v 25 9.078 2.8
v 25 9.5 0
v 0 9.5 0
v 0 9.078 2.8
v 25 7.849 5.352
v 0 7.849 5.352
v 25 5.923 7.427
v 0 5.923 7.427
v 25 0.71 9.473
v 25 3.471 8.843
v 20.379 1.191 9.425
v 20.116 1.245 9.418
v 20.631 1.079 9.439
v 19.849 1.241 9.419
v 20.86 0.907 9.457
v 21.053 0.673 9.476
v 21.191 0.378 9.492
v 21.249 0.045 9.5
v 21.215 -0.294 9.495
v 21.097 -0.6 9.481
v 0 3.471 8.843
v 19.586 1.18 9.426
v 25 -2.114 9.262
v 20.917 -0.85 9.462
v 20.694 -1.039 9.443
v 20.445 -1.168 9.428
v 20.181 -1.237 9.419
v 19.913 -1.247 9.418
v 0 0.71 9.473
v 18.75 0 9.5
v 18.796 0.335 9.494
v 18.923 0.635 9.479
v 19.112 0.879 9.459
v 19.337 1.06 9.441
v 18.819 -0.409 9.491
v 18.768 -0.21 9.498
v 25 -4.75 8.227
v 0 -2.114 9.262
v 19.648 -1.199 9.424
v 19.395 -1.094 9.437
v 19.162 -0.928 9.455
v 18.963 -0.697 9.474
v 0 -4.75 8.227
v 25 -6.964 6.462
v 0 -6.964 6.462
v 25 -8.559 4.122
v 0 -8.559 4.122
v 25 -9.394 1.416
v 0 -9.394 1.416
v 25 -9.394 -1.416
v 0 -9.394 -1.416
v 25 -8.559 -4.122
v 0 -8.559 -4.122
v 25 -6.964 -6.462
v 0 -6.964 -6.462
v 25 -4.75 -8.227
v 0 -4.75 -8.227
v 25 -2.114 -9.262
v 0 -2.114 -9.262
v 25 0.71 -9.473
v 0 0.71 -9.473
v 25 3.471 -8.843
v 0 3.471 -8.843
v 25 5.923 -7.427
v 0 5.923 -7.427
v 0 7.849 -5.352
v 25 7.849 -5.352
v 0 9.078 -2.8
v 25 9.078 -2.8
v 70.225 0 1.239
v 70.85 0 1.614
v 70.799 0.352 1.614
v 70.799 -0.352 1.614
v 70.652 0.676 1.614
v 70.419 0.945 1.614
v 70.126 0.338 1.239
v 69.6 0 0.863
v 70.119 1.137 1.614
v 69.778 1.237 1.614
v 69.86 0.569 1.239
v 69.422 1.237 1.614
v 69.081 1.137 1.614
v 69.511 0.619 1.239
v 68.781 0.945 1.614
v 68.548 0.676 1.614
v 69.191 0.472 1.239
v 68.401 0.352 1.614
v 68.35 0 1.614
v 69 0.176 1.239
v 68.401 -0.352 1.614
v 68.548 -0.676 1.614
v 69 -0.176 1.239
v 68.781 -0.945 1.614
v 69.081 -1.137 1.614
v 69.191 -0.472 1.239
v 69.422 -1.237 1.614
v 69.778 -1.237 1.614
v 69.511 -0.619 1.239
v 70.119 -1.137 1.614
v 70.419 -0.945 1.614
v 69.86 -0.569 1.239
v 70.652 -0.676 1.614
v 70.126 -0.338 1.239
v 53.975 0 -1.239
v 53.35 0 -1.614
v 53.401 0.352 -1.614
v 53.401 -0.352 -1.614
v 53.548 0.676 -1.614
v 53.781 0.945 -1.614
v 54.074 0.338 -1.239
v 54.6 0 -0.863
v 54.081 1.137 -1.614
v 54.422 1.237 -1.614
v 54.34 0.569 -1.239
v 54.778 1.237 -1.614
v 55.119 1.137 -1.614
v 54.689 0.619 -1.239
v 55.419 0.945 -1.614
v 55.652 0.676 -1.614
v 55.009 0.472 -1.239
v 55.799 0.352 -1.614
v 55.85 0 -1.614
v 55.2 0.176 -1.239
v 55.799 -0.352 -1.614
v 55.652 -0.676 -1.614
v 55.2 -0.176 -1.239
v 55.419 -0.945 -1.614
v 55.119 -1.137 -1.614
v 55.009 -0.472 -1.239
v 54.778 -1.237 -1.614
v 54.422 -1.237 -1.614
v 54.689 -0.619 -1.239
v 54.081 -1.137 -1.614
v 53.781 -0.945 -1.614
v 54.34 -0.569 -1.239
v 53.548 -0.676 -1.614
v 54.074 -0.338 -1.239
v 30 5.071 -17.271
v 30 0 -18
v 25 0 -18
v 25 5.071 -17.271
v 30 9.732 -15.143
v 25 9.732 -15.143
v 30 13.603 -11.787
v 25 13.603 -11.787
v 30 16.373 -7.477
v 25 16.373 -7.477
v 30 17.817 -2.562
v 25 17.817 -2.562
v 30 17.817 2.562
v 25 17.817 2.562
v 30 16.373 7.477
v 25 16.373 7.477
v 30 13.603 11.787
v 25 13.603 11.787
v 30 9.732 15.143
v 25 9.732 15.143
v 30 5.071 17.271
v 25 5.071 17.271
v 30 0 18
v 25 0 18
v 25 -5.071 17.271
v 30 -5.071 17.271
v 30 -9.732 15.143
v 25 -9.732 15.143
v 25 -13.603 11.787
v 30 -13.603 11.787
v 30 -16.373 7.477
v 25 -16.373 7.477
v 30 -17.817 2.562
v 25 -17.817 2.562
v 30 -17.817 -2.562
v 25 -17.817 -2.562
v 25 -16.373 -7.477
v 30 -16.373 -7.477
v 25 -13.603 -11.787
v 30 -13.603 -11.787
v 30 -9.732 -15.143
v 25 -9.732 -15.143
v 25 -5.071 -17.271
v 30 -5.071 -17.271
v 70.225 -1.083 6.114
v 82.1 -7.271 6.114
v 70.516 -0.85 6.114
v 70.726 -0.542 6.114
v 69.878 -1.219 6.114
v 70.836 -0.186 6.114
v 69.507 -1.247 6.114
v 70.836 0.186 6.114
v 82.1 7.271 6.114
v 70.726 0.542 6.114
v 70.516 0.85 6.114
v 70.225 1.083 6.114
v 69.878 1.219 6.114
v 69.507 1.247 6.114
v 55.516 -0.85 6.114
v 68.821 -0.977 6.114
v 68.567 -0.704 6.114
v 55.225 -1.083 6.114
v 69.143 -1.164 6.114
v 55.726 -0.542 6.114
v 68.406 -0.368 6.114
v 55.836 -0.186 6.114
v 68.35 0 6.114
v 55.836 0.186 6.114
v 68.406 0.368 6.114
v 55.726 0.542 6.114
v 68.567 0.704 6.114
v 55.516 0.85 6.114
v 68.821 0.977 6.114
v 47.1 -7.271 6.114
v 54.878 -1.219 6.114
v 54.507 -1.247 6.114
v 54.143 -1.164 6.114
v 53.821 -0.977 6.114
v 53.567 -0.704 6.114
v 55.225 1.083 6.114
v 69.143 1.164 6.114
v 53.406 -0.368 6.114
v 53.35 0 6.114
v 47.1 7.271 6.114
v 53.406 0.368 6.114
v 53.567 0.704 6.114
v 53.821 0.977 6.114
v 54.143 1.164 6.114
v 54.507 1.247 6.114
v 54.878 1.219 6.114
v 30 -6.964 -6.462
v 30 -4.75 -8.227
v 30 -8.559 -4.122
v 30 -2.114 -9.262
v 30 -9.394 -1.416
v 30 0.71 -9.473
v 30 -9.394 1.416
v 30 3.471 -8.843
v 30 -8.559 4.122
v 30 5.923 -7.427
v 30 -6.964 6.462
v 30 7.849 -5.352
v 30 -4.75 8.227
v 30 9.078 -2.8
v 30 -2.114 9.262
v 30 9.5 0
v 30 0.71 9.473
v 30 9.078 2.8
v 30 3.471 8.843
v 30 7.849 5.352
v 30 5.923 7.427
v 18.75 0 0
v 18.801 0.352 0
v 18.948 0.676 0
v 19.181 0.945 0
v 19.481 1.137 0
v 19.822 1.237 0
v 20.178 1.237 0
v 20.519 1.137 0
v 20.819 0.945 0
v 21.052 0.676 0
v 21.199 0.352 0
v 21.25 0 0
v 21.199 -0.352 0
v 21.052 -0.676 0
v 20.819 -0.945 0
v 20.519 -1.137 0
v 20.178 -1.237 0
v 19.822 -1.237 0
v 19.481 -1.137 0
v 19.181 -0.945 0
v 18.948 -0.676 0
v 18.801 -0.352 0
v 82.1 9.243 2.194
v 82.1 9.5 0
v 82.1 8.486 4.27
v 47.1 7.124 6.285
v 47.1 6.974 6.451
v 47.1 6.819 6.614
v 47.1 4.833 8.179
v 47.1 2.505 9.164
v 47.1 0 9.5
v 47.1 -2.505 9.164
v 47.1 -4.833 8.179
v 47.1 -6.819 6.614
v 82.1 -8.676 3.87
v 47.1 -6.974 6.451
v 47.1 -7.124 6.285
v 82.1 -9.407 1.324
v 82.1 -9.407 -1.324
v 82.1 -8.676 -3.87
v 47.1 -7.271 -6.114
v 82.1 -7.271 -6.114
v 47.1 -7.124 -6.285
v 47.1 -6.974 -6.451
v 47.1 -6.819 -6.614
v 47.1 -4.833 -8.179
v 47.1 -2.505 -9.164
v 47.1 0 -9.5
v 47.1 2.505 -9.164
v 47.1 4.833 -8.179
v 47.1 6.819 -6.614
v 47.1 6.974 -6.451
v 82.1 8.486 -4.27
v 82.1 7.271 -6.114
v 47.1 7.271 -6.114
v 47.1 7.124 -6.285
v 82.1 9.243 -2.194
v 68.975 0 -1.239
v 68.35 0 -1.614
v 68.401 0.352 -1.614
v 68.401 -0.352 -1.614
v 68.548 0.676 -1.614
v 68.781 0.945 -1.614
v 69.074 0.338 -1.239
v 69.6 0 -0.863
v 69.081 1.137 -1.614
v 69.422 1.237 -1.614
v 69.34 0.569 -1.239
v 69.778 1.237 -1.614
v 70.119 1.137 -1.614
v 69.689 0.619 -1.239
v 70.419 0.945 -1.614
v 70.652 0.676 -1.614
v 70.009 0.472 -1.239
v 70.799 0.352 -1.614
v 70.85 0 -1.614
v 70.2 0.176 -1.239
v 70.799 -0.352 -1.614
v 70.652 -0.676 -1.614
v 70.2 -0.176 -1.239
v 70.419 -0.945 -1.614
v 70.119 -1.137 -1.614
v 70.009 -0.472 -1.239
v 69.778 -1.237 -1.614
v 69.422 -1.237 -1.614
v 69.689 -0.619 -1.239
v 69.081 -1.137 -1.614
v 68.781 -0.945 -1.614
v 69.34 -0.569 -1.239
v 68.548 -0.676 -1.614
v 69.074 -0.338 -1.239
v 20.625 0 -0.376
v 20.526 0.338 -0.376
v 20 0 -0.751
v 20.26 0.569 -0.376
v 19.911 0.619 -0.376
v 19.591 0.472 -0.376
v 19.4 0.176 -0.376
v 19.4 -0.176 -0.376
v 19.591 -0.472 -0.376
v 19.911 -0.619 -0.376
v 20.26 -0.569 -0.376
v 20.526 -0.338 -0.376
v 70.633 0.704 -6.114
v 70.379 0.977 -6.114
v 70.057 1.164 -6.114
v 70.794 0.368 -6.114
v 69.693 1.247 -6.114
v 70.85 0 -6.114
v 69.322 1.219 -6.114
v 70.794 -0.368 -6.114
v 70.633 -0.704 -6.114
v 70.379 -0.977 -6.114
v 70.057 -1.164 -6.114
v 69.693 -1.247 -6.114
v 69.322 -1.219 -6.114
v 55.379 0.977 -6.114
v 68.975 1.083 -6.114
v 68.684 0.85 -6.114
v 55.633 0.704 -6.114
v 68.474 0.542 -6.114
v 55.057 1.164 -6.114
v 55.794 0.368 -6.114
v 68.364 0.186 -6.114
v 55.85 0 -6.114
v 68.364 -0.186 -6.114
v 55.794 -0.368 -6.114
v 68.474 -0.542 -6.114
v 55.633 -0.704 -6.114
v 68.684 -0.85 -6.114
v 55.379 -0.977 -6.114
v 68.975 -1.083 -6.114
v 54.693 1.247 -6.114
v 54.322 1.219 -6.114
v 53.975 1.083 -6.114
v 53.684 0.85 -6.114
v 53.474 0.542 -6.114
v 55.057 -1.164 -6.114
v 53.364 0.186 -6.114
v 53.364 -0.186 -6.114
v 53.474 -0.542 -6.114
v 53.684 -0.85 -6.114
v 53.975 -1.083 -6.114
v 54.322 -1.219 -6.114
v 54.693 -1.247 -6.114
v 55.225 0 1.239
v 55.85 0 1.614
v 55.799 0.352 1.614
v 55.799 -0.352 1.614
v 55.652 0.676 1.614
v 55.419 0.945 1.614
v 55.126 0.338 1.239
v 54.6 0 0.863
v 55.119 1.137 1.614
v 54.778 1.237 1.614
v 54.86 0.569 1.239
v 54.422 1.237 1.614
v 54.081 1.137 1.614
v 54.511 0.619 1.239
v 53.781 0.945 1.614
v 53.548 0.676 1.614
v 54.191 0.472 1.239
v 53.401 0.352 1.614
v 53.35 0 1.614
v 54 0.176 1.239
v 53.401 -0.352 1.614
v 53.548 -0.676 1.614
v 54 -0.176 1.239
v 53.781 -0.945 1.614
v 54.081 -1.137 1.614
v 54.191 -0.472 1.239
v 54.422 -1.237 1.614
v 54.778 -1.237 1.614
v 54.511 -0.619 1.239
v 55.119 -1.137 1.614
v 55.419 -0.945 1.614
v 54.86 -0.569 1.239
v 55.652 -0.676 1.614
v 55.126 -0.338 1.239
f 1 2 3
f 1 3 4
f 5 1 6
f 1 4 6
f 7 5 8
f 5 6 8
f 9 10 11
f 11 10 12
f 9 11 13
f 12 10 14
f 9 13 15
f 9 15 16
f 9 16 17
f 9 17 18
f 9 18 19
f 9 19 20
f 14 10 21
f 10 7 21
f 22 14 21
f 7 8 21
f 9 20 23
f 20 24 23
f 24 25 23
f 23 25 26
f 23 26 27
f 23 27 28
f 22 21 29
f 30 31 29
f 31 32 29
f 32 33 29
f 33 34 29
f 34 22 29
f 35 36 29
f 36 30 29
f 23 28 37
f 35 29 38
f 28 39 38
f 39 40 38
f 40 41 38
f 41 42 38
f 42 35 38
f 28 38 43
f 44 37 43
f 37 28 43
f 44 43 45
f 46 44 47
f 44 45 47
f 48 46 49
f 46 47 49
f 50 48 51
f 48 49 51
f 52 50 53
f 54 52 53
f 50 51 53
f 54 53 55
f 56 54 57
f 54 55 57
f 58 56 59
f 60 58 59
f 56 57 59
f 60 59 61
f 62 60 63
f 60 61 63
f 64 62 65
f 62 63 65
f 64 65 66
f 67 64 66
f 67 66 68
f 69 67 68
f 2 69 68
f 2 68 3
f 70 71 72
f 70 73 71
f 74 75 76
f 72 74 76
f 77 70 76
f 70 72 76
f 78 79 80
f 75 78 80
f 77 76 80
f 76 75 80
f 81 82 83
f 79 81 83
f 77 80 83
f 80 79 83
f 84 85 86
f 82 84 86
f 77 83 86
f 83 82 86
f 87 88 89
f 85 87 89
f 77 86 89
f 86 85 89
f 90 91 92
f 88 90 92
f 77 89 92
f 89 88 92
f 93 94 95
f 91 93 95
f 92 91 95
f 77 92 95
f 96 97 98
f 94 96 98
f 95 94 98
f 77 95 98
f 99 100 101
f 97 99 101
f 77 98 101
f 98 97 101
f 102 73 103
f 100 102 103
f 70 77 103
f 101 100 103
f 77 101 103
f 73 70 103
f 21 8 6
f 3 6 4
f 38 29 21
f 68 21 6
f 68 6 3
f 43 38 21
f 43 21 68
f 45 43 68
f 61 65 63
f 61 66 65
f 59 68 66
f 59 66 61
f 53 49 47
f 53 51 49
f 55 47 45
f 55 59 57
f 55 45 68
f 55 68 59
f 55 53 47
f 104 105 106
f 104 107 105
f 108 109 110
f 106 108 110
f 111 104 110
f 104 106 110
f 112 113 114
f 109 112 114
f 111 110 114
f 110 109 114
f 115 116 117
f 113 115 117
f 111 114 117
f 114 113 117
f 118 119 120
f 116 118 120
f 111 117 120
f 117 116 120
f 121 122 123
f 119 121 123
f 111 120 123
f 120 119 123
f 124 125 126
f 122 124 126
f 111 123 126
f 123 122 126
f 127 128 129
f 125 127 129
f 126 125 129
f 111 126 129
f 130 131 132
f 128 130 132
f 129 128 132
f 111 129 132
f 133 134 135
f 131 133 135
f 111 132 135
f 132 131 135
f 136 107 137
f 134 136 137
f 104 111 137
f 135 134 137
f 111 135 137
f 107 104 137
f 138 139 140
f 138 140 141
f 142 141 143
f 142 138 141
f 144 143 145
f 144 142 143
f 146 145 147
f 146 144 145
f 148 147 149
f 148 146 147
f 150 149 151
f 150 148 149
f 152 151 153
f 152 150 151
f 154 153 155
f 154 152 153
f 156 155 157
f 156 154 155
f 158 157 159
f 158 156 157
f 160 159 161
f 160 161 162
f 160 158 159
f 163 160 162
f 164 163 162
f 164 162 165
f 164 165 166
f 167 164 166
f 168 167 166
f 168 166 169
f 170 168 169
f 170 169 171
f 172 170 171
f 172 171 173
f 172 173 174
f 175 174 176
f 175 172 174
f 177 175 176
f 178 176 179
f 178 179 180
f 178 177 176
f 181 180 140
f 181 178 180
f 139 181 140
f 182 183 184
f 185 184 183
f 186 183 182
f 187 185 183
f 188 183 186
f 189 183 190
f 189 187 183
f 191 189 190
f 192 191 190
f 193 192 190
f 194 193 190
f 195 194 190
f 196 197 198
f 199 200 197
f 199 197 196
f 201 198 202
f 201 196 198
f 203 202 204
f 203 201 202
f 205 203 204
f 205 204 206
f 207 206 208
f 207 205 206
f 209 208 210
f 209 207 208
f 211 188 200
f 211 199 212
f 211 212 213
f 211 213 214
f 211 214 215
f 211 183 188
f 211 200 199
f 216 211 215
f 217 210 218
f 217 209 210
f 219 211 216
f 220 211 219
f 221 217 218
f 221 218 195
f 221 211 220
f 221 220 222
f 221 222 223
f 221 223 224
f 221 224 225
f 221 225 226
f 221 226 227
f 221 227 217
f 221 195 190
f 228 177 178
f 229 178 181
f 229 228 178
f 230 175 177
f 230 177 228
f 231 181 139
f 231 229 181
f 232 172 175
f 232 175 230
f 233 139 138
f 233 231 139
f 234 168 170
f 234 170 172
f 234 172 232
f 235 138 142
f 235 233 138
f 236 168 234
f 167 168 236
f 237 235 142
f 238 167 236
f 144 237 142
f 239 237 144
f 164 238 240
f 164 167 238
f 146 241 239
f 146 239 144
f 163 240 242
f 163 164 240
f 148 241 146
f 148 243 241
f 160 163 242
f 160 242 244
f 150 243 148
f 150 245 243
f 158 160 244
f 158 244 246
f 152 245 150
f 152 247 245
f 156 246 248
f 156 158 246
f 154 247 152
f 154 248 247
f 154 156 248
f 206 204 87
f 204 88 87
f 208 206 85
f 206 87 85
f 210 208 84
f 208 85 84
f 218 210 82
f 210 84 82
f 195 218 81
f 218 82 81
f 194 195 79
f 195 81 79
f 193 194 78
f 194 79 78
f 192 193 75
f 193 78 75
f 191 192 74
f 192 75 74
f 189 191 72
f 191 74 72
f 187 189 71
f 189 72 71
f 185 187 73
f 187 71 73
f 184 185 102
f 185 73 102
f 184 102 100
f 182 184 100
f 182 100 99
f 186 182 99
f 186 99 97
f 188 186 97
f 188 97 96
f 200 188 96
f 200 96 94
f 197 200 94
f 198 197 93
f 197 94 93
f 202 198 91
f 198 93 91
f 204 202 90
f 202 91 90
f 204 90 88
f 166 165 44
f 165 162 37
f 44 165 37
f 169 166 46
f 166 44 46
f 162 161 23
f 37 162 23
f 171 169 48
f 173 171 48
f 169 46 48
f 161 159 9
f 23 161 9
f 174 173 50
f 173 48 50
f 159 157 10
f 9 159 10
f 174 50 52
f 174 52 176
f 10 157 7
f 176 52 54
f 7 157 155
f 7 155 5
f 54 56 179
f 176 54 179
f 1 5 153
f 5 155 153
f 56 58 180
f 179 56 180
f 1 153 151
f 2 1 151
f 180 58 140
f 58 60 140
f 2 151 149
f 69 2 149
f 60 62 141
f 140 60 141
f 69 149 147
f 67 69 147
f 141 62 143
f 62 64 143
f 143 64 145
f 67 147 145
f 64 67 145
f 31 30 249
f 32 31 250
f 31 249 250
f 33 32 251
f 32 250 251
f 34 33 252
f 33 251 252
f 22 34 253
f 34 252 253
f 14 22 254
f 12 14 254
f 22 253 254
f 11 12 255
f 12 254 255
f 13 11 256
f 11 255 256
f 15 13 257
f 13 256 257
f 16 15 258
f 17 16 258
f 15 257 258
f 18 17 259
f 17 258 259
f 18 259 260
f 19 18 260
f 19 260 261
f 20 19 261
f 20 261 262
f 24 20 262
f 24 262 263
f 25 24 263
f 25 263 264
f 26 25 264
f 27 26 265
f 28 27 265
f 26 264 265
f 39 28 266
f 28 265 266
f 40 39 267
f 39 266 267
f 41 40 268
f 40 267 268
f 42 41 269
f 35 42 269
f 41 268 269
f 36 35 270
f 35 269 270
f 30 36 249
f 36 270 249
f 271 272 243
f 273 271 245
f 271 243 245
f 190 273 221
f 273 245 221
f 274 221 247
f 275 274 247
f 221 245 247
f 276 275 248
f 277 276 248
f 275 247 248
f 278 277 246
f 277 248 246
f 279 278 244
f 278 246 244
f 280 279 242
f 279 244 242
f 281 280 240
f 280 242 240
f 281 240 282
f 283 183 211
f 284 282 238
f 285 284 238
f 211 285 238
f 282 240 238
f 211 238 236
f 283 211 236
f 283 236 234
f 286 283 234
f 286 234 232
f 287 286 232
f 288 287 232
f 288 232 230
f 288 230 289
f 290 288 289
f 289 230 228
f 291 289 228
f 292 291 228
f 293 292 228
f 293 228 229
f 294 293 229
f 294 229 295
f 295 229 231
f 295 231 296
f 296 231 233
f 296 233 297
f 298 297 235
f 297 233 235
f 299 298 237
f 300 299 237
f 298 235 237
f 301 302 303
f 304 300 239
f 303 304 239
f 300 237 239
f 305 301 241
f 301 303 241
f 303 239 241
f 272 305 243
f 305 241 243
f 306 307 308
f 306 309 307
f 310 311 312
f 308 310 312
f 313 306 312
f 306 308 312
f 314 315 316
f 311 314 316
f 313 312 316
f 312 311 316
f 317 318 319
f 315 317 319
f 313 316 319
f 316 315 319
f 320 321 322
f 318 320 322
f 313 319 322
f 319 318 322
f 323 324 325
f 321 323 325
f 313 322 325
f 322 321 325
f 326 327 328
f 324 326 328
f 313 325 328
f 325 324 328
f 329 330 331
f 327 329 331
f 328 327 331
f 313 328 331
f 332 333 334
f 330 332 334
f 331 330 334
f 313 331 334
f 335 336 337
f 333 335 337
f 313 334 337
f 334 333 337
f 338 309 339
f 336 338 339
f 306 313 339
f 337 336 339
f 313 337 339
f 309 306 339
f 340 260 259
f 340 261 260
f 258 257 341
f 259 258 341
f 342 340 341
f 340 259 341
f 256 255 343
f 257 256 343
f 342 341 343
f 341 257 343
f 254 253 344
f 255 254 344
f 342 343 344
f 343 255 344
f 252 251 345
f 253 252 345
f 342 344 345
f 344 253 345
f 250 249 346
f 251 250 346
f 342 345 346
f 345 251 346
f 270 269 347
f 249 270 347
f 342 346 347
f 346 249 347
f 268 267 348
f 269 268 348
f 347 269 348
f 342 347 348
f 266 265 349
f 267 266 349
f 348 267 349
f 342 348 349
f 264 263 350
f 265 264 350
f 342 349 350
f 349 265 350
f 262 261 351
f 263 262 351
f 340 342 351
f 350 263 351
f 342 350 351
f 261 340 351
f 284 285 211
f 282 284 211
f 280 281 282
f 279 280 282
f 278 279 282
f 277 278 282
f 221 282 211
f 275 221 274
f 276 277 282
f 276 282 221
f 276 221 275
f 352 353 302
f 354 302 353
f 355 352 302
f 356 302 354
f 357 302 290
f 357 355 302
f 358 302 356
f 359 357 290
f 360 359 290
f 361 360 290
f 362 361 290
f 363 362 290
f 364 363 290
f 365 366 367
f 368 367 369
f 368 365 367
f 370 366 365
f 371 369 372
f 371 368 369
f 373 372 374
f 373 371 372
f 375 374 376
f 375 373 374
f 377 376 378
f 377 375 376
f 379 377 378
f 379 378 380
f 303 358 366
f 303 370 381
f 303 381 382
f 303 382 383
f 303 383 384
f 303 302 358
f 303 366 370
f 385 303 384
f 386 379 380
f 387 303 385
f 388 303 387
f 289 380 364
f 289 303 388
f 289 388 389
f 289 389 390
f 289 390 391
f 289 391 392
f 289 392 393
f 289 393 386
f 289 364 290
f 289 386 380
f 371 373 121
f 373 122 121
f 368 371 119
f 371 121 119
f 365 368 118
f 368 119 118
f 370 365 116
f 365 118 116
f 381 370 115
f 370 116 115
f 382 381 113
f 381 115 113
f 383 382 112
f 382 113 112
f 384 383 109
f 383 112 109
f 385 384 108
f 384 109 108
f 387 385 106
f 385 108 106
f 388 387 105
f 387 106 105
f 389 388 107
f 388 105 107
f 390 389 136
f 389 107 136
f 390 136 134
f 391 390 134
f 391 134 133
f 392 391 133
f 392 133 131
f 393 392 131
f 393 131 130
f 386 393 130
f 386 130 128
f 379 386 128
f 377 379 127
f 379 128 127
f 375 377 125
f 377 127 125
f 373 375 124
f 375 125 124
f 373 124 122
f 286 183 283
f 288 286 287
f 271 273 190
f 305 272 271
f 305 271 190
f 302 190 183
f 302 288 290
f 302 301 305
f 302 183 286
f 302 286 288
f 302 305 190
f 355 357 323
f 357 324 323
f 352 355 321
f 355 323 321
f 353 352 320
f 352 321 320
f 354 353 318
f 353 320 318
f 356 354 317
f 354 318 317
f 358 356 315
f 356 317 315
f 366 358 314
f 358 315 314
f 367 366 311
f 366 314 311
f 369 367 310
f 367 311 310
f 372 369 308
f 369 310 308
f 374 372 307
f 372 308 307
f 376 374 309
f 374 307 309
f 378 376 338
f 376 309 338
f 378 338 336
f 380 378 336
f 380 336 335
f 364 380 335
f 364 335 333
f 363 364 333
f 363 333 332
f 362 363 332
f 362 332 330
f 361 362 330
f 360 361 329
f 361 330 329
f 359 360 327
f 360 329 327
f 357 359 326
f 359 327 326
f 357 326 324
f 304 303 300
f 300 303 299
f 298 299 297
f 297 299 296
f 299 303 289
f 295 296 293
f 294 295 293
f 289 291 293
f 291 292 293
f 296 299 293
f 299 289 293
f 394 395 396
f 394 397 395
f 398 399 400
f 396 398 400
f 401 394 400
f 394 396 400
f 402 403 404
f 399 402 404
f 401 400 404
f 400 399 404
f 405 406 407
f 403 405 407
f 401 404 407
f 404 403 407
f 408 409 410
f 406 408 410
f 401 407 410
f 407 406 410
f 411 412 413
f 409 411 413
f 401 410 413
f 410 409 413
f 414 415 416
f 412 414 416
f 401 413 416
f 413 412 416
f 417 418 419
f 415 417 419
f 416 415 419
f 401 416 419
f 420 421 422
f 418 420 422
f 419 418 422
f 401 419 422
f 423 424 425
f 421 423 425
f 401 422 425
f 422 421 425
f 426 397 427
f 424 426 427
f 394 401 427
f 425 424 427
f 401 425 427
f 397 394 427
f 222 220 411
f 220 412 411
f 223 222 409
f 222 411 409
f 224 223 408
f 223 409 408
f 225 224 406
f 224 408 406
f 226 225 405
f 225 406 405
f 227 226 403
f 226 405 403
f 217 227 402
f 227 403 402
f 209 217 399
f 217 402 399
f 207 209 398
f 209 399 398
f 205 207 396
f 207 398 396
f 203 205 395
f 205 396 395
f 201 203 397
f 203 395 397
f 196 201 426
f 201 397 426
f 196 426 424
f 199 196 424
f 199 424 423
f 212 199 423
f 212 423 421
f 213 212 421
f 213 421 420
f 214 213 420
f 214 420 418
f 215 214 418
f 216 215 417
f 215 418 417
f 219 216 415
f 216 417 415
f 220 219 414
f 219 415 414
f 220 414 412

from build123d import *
from build123d.topology import SkipClean

# Parameters (mm, degrees)
SKETCH1_W                           = 47.1
SKETCH1_H                           = 10
BOSS_EXTRUDE1_START                 = 30
BOSS_EXTRUDE1_DEPTH                 = 30
BOSS_EXTRUDE2_START                 = -17.1
SKETCH8_R                           = 18
BOSS_EXTRUDE2_DEPTH                 = 5
M3X0_5_TAPPED_HOLE3_D               = 2.5
M3X0_5_TAPPED_HOLE3_DEPTH           = 10
M3X0_5_TAPPED_HOLE3_TIP             = 0.751075774
M3X0_5_TAPPED_HOLE2_D               = 2.5
M3X0_5_TAPPED_HOLE2_DEPTH           = 5
M3X0_5_TAPPED_HOLE2_TIP             = 0.751075774
M3X0_5_TAPPED_HOLE2_ON_FACE_2_D     = 2.5
M3X0_5_TAPPED_HOLE2_ON_FACE_2_DEPTH = 5
M3X0_5_TAPPED_HOLE2_ON_FACE_2_TIP   = 0.751075774
BOSS_EXTRUDE3_START                 = 5
BOSS_EXTRUDE3_DEPTH                 = 5
TOLERANCING_START                   = 30
TOLERANCING_OUTLINE_R               = 10
TOLERANCING_OUTLINE_R_2             = 9.5
TOLERANCING_DEPTH                   = 52.1
TOLERANCING_2_OUTLINE_R             = 10
TOLERANCING_2_OUTLINE_R_2           = 9.5
TOLERANCING_2_DEPTH                 = 25
TOLERANCING_START_2                 = 47.1
TOLERANCING_3_DEPTH                 = 35


# Read off the part's stored shape, not the designer's step: Tolerancing
with BuildPart() as part:
    # Sketch1 → Revolve1 (revolve)
    with BuildSketch(Plane.XY, mode=Mode.PRIVATE) as revolve1_sk:
        with Locations((23.55, 5)):
            Rectangle(SKETCH1_W, SKETCH1_H)
    revolve(revolve1_sk.sketch.rotate(Axis((0, 0, 0), (1, 0, 0)), 90), axis=Axis((0, 0, 0), (1, 0, 0)))

    # Sketch3 → Boss-Extrude1 (add)
    with BuildSketch(Plane(origin=(47.1, 0, 0), x_dir=(0, 0, -1), z_dir=(1, 0, 0)).offset(BOSS_EXTRUDE1_START)):
        with BuildLine():
            Line((-6.614378278, -7.5), (-6.614378278, 7.5))
            ThreePointArc((-6.614378278, 7.5), (0, 10), (6.614378278, 7.5))
            Line((6.614378278, 7.5), (6.614378278, -7.5))
            ThreePointArc((6.614378278, -7.5), (0, -10), (-6.614378278, -7.5))
        make_face()
    extrude(amount=-BOSS_EXTRUDE1_DEPTH)

    # Sketch8 → Boss-Extrude2 (add)
    with BuildSketch(Plane(origin=(47.1, 0, 0), x_dir=(0, 0, -1), z_dir=(1, 0, 0)).offset(BOSS_EXTRUDE2_START)):
        Circle(SKETCH8_R)
    extrude(amount=-BOSS_EXTRUDE2_DEPTH)

    # M3x0.5 Tapped Hole3
    with Locations(Plane.XY.offset(10)):
        with Locations((20, 0)):
            Hole(M3X0_5_TAPPED_HOLE3_D / 2, depth=M3X0_5_TAPPED_HOLE3_DEPTH)
            with Locations((0, 0, -(M3X0_5_TAPPED_HOLE3_DEPTH + M3X0_5_TAPPED_HOLE3_TIP / 2))):  # 118° drill point
                Cone(0, M3X0_5_TAPPED_HOLE3_D / 2, M3X0_5_TAPPED_HOLE3_TIP, mode=Mode.SUBTRACT)

    # M3x0.5 Tapped Hole2
    with Locations(Plane(origin=(54.6, 0, 6.614378278), x_dir=(1, 0, 0), z_dir=(0, 0, 1))):
        with Locations((0, 0), (15, 0)):
            Hole(M3X0_5_TAPPED_HOLE2_D / 2, depth=M3X0_5_TAPPED_HOLE2_DEPTH)
            with Locations((0, 0, -(M3X0_5_TAPPED_HOLE2_DEPTH + M3X0_5_TAPPED_HOLE2_TIP / 2))):  # 118° drill point
                Cone(0, M3X0_5_TAPPED_HOLE2_D / 2, M3X0_5_TAPPED_HOLE2_TIP, mode=Mode.SUBTRACT)

    # M3x0.5 Tapped Hole2 on face 2
    with Locations(Plane(origin=(69.6, 0, -6.614378278), x_dir=(-1, 0, 0), z_dir=(0, 0, -1))):
        with Locations((0, 0), (15, 0)):
            Hole(M3X0_5_TAPPED_HOLE2_ON_FACE_2_D / 2, depth=M3X0_5_TAPPED_HOLE2_ON_FACE_2_DEPTH)
            with Locations((0, 0, -(M3X0_5_TAPPED_HOLE2_ON_FACE_2_DEPTH + M3X0_5_TAPPED_HOLE2_ON_FACE_2_TIP / 2))):  # 118° drill point
                Cone(0, M3X0_5_TAPPED_HOLE2_ON_FACE_2_D / 2, M3X0_5_TAPPED_HOLE2_ON_FACE_2_TIP, mode=Mode.SUBTRACT)

    # Sketch9 → Boss-Extrude3 (add)
    with SkipClean():  # the faces are left unmerged after this step: merging them gives an invalid solid
        with BuildSketch(Plane(origin=(77.1, 0, 0), x_dir=(0, 0, -1), z_dir=(1, 0, 0)).offset(BOSS_EXTRUDE3_START)):
            with BuildLine():
                Line((6.614378278, -7.5), (6.614378278, 7.5))
                ThreePointArc((6.614378278, 7.5), (0, 10), (-6.614378278, 7.5))
                Line((-6.614378278, 7.5), (-6.614378278, -7.5))
                ThreePointArc((-6.614378278, -7.5), (0, -10), (6.614378278, -7.5))
            make_face()
        extrude(amount=-BOSS_EXTRUDE3_DEPTH)

    # Tolerancing outline → Tolerancing (cut)
    with BuildSketch(Plane.YZ.offset(TOLERANCING_START)):
        Circle(TOLERANCING_OUTLINE_R)
        Circle(TOLERANCING_OUTLINE_R_2, mode=Mode.SUBTRACT)
    extrude(amount=TOLERANCING_DEPTH, mode=Mode.SUBTRACT)

    # Tolerancing 2 outline → Tolerancing 2 (cut)
    with BuildSketch(Plane.YZ):
        Circle(TOLERANCING_2_OUTLINE_R)
        Circle(TOLERANCING_2_OUTLINE_R_2, mode=Mode.SUBTRACT)
    extrude(amount=TOLERANCING_2_DEPTH, mode=Mode.SUBTRACT)

    # Tolerancing 3 outline → Tolerancing 3 (cut)
    with BuildSketch(Plane.YZ.offset(TOLERANCING_START_2)):
        with BuildLine():
            Line((-7.270789385, 6.114378278), (7.270789385, 6.114378278))
            ThreePointArc((7.270789385, 6.114378278), (7.049374529, 6.368384313), (6.819090848, 6.614378278))
            Line((6.819090848, 6.614378278), (-6.819090848, 6.614378278))
            ThreePointArc((-6.819090848, 6.614378278), (-7.049374529, 6.368384313), (-7.270789385, 6.114378278))
        make_face()
        with BuildLine():
            ThreePointArc((6.819090848, -6.614378278), (7.049374529, -6.368384313), (7.270789385, -6.114378278))
            Line((7.270789385, -6.114378278), (-7.270789385, -6.114378278))
            ThreePointArc((-7.270789385, -6.114378278), (-7.049374529, -6.368384313), (-6.819090848, -6.614378278))
            Line((-6.819090848, -6.614378278), (6.819090848, -6.614378278))
        make_face()
    extrude(amount=TOLERANCING_3_DEPTH, mode=Mode.SUBTRACT)


solid = part.part
